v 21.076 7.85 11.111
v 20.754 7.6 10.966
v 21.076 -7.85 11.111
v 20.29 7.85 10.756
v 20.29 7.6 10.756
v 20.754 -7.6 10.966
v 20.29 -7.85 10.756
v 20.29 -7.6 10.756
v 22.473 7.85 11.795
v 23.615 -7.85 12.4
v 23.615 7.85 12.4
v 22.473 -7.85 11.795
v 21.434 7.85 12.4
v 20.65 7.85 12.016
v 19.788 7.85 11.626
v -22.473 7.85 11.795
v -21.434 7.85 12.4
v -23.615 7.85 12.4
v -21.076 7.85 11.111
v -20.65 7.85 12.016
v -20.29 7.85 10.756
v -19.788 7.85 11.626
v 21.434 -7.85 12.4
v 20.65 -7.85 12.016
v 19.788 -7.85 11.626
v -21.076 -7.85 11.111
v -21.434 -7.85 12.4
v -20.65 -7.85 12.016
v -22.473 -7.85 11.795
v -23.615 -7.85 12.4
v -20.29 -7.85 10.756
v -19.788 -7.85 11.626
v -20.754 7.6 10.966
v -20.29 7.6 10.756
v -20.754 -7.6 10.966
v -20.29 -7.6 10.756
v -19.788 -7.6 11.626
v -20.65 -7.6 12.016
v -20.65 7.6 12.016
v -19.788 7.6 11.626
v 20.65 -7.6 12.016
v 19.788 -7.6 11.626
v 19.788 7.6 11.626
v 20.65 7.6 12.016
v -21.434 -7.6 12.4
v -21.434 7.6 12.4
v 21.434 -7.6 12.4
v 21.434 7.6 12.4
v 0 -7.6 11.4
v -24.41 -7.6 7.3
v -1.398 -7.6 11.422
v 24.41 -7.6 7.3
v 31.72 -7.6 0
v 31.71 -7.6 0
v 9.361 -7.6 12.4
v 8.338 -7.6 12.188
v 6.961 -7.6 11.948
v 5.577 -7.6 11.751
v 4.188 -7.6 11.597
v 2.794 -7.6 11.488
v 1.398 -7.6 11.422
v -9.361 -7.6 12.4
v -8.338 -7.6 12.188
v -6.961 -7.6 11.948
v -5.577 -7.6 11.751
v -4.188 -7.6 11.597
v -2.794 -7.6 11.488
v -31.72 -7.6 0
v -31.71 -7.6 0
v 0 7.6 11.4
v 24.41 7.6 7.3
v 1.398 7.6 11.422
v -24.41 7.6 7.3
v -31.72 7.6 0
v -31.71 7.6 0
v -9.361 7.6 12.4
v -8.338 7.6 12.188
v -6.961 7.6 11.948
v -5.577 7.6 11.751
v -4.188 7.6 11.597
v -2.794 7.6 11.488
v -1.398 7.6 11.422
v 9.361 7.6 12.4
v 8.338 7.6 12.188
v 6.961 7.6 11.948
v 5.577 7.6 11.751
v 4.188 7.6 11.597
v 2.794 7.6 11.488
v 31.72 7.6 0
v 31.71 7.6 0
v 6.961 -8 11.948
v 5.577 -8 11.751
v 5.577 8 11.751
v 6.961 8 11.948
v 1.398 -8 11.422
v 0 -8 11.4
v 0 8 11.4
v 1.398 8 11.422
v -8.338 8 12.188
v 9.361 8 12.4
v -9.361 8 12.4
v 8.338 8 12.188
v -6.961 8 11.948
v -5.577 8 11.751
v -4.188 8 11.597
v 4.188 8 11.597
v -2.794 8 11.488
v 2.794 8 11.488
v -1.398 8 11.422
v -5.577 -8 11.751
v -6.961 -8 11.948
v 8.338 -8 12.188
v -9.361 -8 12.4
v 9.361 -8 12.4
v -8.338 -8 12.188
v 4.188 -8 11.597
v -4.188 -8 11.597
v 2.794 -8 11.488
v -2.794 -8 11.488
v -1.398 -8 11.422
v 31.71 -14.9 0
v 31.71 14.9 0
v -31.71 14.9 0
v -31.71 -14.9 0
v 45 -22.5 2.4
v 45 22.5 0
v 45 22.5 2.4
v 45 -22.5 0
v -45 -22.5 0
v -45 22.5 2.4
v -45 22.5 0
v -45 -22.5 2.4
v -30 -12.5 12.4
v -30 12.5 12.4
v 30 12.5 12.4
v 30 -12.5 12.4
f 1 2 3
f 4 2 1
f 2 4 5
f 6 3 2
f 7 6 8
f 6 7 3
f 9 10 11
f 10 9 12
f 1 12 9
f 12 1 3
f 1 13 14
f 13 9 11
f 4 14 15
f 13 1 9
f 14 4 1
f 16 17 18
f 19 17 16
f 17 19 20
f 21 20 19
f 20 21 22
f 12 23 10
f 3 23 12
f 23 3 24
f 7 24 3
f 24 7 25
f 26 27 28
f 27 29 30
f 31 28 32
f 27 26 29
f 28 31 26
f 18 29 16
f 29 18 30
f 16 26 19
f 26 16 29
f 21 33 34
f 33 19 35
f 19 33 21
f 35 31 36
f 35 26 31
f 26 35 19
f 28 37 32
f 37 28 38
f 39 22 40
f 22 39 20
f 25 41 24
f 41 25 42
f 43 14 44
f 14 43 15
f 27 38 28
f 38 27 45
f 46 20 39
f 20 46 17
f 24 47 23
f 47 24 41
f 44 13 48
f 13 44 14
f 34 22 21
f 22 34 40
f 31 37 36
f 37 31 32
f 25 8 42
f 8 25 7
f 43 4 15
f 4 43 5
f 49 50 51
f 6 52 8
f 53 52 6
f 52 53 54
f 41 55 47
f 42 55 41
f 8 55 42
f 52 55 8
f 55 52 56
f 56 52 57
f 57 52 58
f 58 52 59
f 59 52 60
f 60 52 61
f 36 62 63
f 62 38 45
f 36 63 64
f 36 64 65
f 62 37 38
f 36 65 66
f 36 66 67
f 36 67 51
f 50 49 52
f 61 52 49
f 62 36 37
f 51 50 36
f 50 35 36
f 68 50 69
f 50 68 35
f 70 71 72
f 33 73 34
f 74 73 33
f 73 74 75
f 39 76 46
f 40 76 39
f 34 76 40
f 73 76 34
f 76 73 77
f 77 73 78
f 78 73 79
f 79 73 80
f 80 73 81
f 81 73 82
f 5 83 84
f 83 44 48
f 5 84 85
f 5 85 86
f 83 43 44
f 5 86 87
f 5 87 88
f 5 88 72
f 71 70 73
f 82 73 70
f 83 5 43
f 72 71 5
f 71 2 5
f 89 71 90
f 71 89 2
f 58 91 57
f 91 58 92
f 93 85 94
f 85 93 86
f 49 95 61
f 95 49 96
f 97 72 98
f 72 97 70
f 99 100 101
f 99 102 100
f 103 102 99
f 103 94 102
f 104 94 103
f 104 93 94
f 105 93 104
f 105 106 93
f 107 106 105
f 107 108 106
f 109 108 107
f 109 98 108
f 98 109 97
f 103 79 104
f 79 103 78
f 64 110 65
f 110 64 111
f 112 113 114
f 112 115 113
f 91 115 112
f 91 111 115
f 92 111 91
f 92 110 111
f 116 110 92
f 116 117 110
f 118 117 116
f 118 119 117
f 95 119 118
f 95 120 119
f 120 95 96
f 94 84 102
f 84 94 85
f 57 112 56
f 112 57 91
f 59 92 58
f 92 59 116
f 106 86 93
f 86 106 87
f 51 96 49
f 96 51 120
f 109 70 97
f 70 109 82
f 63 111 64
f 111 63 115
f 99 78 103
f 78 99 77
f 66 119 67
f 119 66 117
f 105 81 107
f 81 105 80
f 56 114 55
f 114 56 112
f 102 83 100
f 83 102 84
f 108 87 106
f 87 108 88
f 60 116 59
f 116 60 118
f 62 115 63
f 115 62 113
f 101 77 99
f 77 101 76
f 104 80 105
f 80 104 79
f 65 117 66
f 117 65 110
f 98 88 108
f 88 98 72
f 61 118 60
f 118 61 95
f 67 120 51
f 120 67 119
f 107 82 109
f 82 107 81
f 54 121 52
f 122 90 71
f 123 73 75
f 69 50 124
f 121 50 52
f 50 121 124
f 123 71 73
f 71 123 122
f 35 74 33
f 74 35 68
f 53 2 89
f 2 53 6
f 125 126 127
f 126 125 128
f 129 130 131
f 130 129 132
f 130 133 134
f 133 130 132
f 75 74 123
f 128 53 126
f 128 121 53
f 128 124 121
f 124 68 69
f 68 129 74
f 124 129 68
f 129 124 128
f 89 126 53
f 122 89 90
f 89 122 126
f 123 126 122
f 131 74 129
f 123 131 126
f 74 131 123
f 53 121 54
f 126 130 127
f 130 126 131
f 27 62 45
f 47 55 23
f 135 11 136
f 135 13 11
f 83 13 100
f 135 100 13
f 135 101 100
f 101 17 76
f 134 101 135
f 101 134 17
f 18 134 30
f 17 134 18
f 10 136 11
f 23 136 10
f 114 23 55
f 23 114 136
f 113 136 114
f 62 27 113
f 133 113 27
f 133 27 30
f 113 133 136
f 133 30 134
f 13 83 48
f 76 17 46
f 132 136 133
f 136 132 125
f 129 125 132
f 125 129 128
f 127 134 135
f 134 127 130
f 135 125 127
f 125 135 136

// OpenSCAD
difference(){
hull(){
translate([0,0,1.2])cube([90,45,2.4],center=true);
translate([0,0,1.2+10])cube([60,25,2.4],center=true);
}

translate([0.,0,49.5+12.4-6])rotate([90,0,0]){
#cylinder(r=49.5,h=15.2,center=true,$fn=200);
#cylinder(r=44.5,h=16,center=true,$fn=200);
#difference(){
cylinder(r=49.5,h=15.7,center=true,$fn=200);
cylinder(r=48.5,h=17,center=true,$fn=200);
translate([0,-60,0])rotate(-30)cylinder(r=50,h=17,center=true,$fn=3);
}
}
translate([0,0,-0.1]){
hull(){
translate([-16.81,0,0])rotate(45)cylinder(r1=15*sqrt(2),r2=0,h=15,$fn=4);
translate([16.81,0,0])rotate(45)cylinder(r1=15*sqrt(2),r2=0,h=15,$fn=4);
}
rotate([90,0,0])rotate(45)cube([45,45,15.2],center=true);
}
}
